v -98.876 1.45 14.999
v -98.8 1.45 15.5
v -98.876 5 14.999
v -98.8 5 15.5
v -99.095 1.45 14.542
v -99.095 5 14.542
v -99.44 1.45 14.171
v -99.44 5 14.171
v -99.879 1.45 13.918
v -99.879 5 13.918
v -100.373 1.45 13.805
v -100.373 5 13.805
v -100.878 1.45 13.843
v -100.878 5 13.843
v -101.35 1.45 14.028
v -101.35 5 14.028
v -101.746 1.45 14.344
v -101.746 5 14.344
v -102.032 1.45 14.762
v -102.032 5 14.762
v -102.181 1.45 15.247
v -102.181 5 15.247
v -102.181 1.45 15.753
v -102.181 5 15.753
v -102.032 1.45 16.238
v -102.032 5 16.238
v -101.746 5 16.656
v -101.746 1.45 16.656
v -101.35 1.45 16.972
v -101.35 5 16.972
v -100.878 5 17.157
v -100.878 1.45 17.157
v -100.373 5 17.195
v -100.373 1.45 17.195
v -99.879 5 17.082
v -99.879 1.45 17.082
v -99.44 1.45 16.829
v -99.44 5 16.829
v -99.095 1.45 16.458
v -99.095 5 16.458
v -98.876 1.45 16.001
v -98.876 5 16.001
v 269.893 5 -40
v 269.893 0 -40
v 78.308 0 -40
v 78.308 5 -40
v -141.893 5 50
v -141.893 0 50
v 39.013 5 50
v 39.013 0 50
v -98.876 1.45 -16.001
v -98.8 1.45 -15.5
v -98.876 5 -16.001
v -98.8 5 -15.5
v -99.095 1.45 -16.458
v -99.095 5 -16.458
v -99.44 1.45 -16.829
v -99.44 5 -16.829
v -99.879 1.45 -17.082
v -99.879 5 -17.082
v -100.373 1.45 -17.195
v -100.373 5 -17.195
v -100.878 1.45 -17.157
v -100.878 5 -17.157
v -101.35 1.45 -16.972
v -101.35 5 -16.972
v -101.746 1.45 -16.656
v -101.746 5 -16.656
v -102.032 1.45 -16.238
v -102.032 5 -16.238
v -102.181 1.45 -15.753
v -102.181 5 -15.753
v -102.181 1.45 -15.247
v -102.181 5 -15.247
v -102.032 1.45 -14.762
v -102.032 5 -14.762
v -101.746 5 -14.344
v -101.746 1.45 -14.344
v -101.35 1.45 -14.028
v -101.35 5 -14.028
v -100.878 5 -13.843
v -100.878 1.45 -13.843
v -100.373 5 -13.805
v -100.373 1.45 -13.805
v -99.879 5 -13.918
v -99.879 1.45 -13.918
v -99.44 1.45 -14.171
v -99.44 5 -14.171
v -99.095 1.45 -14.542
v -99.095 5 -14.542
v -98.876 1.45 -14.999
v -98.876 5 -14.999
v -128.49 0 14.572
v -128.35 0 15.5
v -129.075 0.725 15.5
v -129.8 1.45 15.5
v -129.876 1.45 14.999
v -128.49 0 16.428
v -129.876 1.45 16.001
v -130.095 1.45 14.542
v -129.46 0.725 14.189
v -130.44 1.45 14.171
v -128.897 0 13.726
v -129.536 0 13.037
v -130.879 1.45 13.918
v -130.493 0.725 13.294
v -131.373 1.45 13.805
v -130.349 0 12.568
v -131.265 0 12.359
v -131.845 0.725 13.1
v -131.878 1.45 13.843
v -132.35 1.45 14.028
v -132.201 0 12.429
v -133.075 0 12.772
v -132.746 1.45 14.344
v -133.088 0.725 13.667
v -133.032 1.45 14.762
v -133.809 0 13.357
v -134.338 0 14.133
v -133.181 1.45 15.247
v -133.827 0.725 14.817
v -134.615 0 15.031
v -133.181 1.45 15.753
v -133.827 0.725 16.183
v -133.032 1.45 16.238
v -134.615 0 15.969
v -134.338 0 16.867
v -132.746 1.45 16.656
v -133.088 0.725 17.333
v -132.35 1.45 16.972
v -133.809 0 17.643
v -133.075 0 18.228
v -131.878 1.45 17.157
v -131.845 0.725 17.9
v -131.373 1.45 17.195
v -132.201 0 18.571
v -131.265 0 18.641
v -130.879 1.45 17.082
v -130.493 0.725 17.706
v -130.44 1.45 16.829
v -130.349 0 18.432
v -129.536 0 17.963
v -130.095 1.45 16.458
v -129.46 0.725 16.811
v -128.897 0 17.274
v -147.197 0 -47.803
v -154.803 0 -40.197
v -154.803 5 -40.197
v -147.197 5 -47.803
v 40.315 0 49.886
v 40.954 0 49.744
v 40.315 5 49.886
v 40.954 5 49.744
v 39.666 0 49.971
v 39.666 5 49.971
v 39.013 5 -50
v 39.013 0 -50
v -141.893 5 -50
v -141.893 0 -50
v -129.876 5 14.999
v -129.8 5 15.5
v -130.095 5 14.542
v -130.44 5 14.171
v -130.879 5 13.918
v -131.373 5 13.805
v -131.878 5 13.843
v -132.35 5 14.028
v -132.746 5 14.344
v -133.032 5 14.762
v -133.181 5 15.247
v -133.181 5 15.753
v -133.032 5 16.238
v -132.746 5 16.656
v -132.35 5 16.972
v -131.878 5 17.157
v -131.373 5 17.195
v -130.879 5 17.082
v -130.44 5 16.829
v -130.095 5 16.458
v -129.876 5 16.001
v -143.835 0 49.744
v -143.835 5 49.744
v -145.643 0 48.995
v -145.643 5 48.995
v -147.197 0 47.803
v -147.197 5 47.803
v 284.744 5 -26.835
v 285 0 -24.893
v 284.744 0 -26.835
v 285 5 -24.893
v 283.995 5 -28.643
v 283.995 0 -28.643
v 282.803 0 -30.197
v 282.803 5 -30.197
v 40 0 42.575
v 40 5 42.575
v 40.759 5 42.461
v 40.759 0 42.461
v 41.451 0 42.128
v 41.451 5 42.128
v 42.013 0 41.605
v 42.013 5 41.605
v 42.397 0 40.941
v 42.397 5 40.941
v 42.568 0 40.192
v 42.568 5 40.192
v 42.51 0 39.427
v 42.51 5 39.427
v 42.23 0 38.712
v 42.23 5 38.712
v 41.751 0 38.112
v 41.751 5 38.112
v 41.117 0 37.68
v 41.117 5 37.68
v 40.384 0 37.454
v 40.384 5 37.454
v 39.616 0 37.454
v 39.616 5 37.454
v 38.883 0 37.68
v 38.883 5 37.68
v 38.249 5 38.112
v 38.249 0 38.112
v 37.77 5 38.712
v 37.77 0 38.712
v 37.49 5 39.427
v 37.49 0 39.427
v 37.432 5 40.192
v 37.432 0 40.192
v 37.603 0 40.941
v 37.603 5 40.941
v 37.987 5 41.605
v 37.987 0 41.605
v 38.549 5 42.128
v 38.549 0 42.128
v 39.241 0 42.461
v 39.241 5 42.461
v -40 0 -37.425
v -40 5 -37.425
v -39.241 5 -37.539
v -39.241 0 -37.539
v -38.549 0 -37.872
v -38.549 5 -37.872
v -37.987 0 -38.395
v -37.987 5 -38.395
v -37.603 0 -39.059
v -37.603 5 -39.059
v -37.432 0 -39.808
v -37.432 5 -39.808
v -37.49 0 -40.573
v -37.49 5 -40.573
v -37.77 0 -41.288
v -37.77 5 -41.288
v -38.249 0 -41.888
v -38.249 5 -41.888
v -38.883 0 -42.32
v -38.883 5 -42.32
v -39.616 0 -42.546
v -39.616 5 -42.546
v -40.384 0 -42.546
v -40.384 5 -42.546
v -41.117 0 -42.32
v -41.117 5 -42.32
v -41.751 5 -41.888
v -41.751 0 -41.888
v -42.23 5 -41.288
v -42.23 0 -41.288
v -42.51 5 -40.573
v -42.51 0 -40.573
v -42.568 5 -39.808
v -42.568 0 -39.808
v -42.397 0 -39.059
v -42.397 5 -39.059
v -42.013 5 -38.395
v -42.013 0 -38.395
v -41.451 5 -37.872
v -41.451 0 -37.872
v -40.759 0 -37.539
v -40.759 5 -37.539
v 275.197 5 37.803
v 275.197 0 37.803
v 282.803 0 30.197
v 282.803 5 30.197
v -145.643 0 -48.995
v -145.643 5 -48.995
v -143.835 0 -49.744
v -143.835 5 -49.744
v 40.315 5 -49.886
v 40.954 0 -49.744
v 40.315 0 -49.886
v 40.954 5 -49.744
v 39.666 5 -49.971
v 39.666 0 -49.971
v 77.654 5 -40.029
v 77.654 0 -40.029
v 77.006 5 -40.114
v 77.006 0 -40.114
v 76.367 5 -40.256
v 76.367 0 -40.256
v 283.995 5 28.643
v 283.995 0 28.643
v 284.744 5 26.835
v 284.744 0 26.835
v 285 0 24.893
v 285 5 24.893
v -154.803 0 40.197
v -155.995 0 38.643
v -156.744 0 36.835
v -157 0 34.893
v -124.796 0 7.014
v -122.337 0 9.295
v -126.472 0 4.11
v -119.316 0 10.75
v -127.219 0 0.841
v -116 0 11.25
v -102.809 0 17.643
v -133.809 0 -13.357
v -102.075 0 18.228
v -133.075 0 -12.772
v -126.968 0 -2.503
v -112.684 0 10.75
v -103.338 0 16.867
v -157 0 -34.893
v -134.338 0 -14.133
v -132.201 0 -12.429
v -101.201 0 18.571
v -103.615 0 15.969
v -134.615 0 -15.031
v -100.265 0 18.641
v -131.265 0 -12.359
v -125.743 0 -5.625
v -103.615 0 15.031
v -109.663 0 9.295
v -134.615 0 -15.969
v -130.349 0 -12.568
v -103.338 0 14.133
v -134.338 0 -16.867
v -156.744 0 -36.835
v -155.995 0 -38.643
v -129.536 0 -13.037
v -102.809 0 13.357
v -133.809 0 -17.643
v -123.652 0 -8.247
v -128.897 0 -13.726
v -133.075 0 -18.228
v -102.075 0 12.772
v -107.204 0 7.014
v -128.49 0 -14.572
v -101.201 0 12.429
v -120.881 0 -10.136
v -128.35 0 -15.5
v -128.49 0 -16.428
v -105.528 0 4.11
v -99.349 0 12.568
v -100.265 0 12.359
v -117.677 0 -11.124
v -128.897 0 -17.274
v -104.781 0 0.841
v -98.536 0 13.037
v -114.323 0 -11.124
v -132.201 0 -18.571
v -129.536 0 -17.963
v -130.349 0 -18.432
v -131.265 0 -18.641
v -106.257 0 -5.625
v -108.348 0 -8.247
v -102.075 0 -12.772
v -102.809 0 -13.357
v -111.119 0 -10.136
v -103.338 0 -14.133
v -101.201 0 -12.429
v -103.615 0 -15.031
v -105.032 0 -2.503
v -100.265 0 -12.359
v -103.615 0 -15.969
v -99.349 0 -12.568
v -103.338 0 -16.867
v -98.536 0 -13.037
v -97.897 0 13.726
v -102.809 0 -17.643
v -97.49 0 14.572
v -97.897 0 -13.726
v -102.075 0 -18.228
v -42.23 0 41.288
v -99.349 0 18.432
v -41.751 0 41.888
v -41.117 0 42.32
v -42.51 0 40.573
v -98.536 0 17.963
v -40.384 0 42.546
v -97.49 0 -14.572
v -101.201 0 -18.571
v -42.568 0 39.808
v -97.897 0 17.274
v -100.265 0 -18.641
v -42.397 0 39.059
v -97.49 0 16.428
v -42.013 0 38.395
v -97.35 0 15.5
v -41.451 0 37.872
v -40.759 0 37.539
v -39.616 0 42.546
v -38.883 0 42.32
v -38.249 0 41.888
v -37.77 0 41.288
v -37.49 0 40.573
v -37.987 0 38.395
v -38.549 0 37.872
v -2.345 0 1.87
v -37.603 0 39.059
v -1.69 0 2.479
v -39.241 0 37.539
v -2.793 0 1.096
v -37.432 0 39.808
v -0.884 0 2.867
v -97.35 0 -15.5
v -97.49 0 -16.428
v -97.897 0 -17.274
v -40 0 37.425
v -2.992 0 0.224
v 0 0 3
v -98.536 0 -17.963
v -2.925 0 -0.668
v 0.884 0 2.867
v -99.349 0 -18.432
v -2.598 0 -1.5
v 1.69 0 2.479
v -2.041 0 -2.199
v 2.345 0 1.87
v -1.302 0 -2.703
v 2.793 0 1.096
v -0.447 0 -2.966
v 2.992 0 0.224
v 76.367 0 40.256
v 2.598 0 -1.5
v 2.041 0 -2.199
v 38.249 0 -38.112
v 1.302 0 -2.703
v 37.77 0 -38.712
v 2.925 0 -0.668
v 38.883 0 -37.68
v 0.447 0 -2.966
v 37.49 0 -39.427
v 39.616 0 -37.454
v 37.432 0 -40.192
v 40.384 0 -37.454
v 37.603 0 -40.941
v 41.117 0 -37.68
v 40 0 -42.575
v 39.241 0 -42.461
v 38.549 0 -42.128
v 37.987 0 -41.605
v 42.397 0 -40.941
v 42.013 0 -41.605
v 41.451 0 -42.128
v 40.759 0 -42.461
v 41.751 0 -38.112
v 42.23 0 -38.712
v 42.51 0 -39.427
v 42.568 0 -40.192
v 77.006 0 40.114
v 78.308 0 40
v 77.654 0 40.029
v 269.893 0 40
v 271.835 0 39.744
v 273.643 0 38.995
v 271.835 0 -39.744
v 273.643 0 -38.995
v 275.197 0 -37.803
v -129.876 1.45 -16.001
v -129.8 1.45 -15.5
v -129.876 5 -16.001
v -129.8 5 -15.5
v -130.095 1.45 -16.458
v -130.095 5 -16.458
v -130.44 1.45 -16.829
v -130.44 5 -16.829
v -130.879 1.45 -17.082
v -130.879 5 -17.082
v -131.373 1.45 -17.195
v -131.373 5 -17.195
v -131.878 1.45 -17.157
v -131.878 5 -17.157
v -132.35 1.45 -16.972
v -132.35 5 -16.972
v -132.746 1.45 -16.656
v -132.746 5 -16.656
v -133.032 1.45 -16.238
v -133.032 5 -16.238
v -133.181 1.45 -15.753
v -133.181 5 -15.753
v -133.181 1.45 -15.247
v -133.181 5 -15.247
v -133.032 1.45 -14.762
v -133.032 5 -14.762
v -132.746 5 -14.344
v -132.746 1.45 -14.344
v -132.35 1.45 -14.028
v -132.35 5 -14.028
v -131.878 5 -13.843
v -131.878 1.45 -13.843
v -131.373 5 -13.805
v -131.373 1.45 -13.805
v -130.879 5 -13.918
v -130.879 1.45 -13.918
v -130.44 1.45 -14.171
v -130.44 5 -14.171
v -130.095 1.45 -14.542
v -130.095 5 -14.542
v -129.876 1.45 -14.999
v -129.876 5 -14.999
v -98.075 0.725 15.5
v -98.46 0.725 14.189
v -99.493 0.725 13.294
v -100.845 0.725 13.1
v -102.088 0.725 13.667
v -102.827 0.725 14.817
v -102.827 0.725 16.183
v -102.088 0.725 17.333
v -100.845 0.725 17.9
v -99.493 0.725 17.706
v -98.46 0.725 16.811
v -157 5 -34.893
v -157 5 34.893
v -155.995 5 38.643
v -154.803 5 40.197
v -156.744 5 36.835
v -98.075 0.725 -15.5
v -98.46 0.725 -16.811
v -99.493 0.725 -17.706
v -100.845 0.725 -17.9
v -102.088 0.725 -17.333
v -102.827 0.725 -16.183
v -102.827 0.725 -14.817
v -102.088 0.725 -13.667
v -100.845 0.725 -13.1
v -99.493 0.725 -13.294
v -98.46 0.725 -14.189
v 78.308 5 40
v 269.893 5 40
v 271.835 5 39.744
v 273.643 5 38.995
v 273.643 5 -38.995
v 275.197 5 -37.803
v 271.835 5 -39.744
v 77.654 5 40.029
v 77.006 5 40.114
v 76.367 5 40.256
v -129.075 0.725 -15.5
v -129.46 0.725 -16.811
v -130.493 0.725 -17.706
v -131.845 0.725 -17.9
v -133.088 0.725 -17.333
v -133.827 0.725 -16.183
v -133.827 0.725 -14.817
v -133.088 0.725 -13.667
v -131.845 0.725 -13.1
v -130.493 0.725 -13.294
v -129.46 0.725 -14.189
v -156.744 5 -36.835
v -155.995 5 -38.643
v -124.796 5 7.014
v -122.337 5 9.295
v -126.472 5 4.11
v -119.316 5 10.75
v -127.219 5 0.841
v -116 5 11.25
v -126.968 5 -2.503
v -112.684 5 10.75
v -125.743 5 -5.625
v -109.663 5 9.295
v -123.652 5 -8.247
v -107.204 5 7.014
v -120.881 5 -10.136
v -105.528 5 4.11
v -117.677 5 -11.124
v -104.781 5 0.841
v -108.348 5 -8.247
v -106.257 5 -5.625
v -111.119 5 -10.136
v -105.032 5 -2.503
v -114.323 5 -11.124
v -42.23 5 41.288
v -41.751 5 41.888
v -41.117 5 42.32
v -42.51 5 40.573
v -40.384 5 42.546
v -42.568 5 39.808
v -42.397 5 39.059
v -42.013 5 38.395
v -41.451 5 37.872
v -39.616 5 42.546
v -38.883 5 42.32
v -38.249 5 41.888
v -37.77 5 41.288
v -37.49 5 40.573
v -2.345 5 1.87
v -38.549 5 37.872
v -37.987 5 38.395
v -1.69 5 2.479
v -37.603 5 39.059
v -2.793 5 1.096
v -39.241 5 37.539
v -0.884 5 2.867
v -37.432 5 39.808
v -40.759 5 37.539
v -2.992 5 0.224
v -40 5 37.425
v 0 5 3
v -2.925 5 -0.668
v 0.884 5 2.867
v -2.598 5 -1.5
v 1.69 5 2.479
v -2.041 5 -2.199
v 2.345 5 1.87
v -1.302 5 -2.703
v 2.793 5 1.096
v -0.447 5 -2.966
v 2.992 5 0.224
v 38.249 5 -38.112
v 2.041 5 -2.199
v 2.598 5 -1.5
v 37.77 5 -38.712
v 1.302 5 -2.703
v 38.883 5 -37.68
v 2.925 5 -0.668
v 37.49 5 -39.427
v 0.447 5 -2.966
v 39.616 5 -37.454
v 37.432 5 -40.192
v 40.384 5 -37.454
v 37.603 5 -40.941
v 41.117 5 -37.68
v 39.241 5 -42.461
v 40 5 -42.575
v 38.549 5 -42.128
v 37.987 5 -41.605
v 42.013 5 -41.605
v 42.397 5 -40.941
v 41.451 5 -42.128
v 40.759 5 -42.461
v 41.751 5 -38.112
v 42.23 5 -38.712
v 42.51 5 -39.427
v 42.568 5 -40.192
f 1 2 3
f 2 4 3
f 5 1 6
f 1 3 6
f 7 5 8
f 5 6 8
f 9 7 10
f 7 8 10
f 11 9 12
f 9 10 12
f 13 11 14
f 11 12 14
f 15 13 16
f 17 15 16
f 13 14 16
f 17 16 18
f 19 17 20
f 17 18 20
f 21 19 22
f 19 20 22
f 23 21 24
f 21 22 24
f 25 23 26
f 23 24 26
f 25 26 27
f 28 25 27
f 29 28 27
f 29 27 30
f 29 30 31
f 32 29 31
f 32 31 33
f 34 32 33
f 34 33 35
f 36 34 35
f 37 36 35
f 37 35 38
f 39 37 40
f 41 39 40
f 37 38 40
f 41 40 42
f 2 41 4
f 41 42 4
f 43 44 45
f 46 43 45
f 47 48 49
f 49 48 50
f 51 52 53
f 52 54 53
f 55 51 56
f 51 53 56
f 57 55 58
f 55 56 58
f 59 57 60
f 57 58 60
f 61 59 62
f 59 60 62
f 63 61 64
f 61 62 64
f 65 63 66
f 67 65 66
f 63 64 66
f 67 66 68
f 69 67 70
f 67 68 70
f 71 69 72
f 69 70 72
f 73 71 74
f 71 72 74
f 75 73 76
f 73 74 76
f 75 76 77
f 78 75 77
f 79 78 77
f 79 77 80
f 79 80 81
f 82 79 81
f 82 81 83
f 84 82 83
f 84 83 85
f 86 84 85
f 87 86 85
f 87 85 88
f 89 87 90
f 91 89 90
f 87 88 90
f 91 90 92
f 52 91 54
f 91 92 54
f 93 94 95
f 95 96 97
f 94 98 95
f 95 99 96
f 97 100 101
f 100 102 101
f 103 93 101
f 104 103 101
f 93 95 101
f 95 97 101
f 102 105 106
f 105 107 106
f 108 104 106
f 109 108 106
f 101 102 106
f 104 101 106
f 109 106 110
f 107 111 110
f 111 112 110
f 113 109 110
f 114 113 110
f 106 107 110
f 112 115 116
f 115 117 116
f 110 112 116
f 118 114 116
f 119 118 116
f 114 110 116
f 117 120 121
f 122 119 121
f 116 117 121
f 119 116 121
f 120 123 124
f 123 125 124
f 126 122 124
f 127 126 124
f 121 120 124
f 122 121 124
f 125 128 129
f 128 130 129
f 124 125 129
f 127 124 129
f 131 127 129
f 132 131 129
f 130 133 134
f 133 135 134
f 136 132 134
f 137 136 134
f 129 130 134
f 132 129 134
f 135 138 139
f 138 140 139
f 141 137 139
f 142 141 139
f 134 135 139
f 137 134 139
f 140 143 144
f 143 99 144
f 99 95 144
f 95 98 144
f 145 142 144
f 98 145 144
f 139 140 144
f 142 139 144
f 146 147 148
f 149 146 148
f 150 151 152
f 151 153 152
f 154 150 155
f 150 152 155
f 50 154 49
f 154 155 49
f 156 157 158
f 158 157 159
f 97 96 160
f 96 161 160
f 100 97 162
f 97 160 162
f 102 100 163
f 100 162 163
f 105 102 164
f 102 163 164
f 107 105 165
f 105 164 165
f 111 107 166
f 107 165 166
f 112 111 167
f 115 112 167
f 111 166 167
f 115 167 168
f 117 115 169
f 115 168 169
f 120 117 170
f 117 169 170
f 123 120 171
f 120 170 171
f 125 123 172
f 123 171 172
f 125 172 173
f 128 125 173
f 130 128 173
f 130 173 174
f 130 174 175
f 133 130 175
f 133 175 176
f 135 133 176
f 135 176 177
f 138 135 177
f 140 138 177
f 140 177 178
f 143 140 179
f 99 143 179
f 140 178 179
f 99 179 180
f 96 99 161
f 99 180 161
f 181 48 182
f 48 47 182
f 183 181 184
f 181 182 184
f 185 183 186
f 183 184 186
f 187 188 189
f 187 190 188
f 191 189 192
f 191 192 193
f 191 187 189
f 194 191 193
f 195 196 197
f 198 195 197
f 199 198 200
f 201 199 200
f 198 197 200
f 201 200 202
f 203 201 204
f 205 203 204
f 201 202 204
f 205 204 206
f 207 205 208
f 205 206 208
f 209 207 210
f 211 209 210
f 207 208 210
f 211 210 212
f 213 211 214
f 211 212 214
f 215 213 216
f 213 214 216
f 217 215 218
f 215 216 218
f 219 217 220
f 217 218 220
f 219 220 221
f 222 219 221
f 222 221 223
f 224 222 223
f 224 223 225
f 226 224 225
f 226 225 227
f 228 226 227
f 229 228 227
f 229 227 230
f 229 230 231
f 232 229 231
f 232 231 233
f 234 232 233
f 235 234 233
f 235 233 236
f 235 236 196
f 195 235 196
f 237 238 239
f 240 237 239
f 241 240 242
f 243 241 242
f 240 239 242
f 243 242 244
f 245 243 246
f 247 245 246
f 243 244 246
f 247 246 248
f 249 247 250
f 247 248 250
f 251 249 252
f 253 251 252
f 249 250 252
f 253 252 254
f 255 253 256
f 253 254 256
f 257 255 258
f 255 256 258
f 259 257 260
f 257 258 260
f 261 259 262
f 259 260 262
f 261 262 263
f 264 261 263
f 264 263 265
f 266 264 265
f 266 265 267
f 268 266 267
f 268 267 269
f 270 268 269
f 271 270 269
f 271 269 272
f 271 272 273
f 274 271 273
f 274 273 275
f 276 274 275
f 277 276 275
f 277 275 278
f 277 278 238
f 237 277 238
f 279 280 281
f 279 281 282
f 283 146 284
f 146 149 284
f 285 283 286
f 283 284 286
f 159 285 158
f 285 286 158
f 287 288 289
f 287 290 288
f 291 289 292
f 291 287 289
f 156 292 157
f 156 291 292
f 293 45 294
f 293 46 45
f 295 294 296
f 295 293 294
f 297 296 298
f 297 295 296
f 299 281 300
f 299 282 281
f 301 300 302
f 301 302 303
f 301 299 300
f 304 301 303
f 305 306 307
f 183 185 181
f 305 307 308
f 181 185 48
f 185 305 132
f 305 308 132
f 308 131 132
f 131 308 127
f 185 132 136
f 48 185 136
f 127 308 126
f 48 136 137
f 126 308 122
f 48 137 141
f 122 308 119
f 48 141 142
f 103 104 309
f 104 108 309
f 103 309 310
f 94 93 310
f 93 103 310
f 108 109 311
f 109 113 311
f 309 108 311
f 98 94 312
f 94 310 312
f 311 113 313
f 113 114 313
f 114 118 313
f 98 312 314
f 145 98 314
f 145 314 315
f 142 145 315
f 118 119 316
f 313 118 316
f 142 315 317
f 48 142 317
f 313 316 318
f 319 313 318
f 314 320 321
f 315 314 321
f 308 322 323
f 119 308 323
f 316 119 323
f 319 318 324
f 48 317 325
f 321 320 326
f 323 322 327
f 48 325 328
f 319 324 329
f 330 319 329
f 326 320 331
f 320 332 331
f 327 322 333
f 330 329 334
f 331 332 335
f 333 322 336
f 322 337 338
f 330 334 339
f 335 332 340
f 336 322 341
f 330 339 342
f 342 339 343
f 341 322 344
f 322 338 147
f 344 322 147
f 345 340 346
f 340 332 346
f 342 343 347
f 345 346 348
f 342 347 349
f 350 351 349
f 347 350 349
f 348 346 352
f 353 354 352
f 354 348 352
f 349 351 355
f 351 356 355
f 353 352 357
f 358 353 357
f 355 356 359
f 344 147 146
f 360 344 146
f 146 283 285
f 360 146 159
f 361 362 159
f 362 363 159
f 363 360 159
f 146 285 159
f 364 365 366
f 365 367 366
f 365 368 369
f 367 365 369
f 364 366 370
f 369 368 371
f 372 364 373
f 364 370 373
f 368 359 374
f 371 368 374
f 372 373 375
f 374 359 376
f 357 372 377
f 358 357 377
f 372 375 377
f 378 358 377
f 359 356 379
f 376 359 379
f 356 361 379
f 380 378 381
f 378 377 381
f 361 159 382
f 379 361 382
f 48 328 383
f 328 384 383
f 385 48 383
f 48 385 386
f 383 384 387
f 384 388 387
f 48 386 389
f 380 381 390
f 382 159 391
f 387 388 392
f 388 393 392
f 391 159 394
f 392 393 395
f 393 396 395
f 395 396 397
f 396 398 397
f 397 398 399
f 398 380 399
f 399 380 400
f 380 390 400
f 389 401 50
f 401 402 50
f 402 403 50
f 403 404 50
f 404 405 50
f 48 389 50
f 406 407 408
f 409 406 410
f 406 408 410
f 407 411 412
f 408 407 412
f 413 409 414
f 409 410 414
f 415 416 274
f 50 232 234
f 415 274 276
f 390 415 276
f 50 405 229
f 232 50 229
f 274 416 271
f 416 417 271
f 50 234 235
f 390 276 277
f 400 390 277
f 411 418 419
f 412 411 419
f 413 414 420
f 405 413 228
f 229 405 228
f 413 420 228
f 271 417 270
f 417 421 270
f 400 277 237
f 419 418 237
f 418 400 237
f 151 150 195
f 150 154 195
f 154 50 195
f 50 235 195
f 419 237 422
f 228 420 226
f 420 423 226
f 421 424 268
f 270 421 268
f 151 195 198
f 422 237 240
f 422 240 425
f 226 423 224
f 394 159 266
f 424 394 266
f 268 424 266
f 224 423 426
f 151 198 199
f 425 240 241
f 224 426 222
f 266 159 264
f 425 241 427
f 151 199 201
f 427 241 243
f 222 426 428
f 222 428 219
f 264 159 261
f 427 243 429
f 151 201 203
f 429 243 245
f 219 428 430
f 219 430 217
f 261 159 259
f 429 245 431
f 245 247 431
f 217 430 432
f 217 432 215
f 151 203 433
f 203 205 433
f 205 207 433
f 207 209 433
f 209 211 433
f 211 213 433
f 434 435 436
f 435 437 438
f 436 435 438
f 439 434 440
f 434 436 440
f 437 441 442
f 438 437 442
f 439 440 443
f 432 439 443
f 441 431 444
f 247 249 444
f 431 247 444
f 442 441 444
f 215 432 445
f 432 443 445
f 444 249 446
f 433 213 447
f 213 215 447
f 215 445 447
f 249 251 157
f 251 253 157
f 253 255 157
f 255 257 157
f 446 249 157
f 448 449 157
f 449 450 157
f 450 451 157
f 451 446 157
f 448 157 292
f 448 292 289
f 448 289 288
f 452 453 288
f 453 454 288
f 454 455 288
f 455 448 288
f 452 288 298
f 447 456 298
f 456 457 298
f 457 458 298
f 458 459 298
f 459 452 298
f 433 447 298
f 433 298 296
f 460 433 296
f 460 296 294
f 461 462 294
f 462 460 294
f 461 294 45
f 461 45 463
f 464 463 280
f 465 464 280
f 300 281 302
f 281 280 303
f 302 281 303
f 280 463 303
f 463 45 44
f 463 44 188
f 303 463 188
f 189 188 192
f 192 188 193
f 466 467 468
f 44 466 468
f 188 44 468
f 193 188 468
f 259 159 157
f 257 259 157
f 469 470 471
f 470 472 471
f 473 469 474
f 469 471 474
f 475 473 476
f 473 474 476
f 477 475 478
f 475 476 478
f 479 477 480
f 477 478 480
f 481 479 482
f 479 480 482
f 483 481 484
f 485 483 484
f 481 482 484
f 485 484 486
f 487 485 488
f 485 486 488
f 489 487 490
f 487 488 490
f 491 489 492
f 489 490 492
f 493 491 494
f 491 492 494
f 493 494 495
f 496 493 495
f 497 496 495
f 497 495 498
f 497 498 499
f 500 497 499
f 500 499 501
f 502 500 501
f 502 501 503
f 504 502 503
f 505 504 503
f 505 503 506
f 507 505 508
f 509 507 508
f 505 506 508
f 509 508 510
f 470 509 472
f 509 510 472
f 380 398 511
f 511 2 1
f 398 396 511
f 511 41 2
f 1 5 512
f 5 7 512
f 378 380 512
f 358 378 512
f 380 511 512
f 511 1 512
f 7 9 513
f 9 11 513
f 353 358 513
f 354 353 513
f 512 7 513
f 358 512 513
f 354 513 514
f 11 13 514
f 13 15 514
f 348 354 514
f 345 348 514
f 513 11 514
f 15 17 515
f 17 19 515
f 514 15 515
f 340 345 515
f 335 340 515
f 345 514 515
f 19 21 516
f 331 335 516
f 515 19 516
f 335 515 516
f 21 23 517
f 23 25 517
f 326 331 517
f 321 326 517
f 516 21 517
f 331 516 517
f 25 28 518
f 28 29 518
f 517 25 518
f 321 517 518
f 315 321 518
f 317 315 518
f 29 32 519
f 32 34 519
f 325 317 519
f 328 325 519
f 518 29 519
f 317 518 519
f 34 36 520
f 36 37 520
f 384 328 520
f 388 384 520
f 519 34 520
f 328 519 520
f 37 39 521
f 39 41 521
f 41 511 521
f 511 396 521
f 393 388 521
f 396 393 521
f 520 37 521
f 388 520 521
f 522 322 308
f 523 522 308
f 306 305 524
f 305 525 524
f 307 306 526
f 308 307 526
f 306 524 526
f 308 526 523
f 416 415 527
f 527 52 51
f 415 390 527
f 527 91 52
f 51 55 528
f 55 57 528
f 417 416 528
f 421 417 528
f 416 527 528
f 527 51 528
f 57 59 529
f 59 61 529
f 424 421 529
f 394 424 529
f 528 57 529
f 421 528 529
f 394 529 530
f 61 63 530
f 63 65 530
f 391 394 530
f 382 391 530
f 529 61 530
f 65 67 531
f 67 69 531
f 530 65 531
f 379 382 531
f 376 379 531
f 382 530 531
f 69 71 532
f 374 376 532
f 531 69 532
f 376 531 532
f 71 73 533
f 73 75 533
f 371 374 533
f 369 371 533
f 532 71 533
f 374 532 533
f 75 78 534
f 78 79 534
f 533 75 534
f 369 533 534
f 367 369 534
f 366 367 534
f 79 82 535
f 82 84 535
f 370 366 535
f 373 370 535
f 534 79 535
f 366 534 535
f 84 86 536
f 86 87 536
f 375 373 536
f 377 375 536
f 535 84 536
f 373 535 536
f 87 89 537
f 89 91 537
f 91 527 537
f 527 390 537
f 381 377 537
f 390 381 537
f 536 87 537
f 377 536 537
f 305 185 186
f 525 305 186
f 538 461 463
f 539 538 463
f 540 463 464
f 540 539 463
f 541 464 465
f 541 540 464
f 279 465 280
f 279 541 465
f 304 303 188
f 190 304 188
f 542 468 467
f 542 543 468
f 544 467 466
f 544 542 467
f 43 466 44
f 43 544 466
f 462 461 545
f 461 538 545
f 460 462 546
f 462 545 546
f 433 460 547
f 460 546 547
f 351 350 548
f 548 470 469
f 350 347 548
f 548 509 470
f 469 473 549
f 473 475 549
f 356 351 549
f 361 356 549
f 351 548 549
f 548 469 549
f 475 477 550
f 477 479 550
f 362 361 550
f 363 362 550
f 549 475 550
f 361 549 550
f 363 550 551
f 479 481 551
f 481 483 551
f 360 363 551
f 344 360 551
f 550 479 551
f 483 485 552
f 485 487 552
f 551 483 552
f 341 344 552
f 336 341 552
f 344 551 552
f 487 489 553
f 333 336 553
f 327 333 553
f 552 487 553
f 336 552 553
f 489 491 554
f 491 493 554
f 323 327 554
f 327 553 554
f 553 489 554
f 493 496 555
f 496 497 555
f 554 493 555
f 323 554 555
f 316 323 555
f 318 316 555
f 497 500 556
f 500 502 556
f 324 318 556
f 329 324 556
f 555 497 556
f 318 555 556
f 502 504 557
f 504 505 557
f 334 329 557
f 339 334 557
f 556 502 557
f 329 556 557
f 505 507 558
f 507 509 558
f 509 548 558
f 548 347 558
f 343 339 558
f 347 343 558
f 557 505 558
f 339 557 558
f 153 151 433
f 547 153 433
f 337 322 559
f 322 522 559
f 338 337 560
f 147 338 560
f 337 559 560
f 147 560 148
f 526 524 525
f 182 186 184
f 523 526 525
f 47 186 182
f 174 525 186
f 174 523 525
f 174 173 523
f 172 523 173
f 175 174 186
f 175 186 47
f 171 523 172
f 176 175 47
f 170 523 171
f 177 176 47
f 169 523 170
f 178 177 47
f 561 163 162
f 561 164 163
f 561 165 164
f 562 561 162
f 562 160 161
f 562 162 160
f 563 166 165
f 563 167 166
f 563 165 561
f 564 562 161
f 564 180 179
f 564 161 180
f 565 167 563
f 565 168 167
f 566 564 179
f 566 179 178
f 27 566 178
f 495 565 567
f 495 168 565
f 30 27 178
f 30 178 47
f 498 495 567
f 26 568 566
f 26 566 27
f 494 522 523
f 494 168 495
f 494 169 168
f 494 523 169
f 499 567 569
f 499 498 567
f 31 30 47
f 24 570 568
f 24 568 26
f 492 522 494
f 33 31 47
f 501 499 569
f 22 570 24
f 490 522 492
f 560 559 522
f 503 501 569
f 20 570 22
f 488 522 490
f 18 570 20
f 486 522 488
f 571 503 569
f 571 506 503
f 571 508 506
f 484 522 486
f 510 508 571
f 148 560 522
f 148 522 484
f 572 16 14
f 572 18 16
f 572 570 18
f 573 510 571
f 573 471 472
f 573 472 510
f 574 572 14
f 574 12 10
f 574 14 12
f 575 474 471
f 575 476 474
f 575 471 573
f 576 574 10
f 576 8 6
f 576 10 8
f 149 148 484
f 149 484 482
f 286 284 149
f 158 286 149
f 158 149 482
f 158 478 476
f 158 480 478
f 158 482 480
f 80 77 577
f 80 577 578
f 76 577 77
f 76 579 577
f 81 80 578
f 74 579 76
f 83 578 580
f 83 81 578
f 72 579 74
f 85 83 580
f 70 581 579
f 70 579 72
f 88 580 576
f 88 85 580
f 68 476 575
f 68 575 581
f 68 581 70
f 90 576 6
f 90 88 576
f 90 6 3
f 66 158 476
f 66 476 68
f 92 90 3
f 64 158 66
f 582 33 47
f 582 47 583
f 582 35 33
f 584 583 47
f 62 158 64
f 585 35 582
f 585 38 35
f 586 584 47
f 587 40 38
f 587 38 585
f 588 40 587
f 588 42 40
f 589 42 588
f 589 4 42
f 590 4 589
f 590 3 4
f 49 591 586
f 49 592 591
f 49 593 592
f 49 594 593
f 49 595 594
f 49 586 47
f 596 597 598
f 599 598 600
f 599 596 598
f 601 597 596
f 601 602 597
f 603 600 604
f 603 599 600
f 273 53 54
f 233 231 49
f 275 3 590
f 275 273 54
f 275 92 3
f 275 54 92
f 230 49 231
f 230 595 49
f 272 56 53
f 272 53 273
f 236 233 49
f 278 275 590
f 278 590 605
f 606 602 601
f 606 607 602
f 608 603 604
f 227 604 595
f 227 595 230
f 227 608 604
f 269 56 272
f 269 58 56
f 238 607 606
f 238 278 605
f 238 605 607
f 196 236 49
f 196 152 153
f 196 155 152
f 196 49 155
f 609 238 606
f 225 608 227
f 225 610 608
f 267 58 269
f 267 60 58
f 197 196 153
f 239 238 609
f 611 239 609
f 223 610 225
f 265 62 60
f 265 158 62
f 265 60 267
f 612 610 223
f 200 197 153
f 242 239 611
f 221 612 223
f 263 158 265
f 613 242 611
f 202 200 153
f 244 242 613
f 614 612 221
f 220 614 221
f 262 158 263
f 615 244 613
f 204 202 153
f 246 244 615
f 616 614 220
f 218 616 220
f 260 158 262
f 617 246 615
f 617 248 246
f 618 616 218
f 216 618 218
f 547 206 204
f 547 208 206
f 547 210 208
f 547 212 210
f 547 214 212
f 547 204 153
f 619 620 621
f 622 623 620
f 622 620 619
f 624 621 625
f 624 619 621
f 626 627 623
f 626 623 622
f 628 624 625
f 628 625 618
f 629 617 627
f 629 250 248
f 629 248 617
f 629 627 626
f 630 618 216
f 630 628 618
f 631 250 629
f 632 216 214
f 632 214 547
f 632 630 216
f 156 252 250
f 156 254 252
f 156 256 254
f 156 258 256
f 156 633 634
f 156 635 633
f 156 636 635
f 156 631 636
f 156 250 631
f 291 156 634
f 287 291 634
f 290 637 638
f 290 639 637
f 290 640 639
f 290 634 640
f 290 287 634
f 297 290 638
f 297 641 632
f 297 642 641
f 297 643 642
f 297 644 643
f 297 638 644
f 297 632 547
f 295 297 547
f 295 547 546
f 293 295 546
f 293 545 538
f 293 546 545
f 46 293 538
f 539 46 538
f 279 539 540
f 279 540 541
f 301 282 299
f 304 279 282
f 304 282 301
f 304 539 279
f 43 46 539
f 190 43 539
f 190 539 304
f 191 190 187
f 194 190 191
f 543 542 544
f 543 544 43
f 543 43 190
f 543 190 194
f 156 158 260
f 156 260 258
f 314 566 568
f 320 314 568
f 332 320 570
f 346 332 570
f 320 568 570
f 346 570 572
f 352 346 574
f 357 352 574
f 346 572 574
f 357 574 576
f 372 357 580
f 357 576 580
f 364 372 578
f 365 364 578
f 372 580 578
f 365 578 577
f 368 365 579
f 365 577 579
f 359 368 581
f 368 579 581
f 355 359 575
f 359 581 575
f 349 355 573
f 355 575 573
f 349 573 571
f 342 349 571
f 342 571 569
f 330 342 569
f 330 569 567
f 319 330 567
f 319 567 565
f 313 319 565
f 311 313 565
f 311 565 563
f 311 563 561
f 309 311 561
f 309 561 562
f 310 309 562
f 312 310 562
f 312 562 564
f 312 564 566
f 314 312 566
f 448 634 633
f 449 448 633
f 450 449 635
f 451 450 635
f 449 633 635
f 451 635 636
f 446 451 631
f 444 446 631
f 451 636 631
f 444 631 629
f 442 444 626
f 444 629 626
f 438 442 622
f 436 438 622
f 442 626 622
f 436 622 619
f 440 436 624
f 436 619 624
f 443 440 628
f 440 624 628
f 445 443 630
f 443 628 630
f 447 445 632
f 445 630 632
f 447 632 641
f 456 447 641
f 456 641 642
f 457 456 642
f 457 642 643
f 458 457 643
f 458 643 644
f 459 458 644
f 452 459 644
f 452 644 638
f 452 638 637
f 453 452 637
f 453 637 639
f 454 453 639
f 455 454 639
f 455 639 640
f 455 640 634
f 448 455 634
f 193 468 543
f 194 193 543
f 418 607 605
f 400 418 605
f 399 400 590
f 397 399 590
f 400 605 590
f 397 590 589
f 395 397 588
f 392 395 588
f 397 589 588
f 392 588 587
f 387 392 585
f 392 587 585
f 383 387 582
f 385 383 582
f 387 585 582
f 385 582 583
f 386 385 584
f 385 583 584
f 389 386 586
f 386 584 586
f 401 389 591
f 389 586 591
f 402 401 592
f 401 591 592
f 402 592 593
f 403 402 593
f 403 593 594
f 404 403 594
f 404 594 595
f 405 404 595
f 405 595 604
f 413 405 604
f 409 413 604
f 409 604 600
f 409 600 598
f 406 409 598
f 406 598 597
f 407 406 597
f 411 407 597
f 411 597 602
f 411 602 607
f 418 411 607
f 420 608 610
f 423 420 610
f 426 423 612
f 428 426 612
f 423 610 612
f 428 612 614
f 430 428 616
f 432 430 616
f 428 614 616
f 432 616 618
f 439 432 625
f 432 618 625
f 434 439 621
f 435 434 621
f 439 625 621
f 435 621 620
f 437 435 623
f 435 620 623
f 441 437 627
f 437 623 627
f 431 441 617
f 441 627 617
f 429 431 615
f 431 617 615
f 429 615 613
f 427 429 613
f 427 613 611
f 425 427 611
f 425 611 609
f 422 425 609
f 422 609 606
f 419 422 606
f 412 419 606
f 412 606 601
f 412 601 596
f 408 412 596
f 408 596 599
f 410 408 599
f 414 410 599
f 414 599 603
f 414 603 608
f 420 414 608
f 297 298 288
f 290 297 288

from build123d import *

# Parameters (mm, degrees)
BOSS_EXTRUDE2_DEPTH                                 = 5
CHAMFER2_SIZE                                       = 12
FILLET1_R                                           = 7.5
SKETCH2_R                                           = 2.575
SKETCH2_R_2                                         = 11.25
SKETCH2_R_3                                         = 3
CUT_EXTRUDE1_DEPTH                                  = 290.39592257
CSK_FOR_M3_COUNTERSUNK_FLAT_HEAD_SCREW2_D           = 3.4
CSK_FOR_M3_COUNTERSUNK_FLAT_HEAD_SCREW2_CSINK_D     = 6.3
CSK_FOR_M3_COUNTERSUNK_FLAT_HEAD_SCREW2_CSINK_ANGLE = 90


with BuildPart() as part:
    # Sketch1 → Boss-Extrude2 (new body)
    with BuildSketch(Plane(origin=(0, 0, 0), x_dir=(1, 0, 0), z_dir=(0, 1, 0))):
        Polygon((40, -50), (77.320508076, -40), (285, -40), (285, 40), (77.320508076, 40), (40, 50), (-40, 50), (-157, 50), (-157, -50), (-40, -50), align=None)
    extrude(amount=BOSS_EXTRUDE2_DEPTH)

    # Chamfer2
    chamfer2_edges = [part.edges().sort_by_distance(p)[0] for p in [
        (-157, 2.5, 50),
        (-157, 2.5, -50),
        (285, 2.5, -40),
        (285, 2.5, 40),
    ]]
    chamfer(chamfer2_edges, length=CHAMFER2_SIZE)

    # Fillet1
    fillet1_edges = [part.edges().sort_by_distance(p)[0] for p in [
        (40, 2.5, -50),
        (77.320508076, 2.5, -40),
        (77.320508076, 2.5, 40),
        (40, 2.5, 50),
        (-145, 2.5, 50),
        (-157, 2.5, -38),
        (-157, 2.5, 38),
        (-145, 2.5, -50),
        (273, 2.5, -40),
        (285, 2.5, 28),
        (285, 2.5, -28),
        (273, 2.5, 40),
    ]]
    fillet(fillet1_edges, radius=FILLET1_R)

    # Sketch2 → Cut-Extrude1 (cut, through all)
    with BuildSketch(Plane(origin=(0, 5, 0), x_dir=(1, 0, 0), z_dir=(0, 1, 0))):
        with Locations(Location((-40, 40, 0), (0, 0, 270))):
            Circle(SKETCH2_R)
        with Locations(Location((40, 40, 0), (0, 0, 90))):
            Circle(SKETCH2_R)
        with Locations(Location((40, -40, 0), (0, 0, 270))):
            Circle(SKETCH2_R)
        with Locations(Location((-40, -40, 0), (0, 0, 90))):
            Circle(SKETCH2_R)
        with Locations(Location((-116, 0, 0), (0, 0, 270))):
            Circle(SKETCH2_R_2)
        with Locations(Location((0, 0, 0), (0, 0, 270))):
            Circle(SKETCH2_R_3)
    extrude(amount=-CUT_EXTRUDE1_DEPTH, mode=Mode.SUBTRACT)

    # CSK for M3 Countersunk Flat Head Screw2 (through all)
    with Locations(Plane(origin=(0, 0, 0), x_dir=(-1, 0, 0), z_dir=(0, -1, 0))):
        with Locations((131.5, 15.5), (131.5, -15.5), (100.5, -15.5), (100.5, 15.5)):
            CounterSinkHole(CSK_FOR_M3_COUNTERSUNK_FLAT_HEAD_SCREW2_D / 2, CSK_FOR_M3_COUNTERSUNK_FLAT_HEAD_SCREW2_CSINK_D / 2, counter_sink_angle=CSK_FOR_M3_COUNTERSUNK_FLAT_HEAD_SCREW2_CSINK_ANGLE)


solid = part.part
